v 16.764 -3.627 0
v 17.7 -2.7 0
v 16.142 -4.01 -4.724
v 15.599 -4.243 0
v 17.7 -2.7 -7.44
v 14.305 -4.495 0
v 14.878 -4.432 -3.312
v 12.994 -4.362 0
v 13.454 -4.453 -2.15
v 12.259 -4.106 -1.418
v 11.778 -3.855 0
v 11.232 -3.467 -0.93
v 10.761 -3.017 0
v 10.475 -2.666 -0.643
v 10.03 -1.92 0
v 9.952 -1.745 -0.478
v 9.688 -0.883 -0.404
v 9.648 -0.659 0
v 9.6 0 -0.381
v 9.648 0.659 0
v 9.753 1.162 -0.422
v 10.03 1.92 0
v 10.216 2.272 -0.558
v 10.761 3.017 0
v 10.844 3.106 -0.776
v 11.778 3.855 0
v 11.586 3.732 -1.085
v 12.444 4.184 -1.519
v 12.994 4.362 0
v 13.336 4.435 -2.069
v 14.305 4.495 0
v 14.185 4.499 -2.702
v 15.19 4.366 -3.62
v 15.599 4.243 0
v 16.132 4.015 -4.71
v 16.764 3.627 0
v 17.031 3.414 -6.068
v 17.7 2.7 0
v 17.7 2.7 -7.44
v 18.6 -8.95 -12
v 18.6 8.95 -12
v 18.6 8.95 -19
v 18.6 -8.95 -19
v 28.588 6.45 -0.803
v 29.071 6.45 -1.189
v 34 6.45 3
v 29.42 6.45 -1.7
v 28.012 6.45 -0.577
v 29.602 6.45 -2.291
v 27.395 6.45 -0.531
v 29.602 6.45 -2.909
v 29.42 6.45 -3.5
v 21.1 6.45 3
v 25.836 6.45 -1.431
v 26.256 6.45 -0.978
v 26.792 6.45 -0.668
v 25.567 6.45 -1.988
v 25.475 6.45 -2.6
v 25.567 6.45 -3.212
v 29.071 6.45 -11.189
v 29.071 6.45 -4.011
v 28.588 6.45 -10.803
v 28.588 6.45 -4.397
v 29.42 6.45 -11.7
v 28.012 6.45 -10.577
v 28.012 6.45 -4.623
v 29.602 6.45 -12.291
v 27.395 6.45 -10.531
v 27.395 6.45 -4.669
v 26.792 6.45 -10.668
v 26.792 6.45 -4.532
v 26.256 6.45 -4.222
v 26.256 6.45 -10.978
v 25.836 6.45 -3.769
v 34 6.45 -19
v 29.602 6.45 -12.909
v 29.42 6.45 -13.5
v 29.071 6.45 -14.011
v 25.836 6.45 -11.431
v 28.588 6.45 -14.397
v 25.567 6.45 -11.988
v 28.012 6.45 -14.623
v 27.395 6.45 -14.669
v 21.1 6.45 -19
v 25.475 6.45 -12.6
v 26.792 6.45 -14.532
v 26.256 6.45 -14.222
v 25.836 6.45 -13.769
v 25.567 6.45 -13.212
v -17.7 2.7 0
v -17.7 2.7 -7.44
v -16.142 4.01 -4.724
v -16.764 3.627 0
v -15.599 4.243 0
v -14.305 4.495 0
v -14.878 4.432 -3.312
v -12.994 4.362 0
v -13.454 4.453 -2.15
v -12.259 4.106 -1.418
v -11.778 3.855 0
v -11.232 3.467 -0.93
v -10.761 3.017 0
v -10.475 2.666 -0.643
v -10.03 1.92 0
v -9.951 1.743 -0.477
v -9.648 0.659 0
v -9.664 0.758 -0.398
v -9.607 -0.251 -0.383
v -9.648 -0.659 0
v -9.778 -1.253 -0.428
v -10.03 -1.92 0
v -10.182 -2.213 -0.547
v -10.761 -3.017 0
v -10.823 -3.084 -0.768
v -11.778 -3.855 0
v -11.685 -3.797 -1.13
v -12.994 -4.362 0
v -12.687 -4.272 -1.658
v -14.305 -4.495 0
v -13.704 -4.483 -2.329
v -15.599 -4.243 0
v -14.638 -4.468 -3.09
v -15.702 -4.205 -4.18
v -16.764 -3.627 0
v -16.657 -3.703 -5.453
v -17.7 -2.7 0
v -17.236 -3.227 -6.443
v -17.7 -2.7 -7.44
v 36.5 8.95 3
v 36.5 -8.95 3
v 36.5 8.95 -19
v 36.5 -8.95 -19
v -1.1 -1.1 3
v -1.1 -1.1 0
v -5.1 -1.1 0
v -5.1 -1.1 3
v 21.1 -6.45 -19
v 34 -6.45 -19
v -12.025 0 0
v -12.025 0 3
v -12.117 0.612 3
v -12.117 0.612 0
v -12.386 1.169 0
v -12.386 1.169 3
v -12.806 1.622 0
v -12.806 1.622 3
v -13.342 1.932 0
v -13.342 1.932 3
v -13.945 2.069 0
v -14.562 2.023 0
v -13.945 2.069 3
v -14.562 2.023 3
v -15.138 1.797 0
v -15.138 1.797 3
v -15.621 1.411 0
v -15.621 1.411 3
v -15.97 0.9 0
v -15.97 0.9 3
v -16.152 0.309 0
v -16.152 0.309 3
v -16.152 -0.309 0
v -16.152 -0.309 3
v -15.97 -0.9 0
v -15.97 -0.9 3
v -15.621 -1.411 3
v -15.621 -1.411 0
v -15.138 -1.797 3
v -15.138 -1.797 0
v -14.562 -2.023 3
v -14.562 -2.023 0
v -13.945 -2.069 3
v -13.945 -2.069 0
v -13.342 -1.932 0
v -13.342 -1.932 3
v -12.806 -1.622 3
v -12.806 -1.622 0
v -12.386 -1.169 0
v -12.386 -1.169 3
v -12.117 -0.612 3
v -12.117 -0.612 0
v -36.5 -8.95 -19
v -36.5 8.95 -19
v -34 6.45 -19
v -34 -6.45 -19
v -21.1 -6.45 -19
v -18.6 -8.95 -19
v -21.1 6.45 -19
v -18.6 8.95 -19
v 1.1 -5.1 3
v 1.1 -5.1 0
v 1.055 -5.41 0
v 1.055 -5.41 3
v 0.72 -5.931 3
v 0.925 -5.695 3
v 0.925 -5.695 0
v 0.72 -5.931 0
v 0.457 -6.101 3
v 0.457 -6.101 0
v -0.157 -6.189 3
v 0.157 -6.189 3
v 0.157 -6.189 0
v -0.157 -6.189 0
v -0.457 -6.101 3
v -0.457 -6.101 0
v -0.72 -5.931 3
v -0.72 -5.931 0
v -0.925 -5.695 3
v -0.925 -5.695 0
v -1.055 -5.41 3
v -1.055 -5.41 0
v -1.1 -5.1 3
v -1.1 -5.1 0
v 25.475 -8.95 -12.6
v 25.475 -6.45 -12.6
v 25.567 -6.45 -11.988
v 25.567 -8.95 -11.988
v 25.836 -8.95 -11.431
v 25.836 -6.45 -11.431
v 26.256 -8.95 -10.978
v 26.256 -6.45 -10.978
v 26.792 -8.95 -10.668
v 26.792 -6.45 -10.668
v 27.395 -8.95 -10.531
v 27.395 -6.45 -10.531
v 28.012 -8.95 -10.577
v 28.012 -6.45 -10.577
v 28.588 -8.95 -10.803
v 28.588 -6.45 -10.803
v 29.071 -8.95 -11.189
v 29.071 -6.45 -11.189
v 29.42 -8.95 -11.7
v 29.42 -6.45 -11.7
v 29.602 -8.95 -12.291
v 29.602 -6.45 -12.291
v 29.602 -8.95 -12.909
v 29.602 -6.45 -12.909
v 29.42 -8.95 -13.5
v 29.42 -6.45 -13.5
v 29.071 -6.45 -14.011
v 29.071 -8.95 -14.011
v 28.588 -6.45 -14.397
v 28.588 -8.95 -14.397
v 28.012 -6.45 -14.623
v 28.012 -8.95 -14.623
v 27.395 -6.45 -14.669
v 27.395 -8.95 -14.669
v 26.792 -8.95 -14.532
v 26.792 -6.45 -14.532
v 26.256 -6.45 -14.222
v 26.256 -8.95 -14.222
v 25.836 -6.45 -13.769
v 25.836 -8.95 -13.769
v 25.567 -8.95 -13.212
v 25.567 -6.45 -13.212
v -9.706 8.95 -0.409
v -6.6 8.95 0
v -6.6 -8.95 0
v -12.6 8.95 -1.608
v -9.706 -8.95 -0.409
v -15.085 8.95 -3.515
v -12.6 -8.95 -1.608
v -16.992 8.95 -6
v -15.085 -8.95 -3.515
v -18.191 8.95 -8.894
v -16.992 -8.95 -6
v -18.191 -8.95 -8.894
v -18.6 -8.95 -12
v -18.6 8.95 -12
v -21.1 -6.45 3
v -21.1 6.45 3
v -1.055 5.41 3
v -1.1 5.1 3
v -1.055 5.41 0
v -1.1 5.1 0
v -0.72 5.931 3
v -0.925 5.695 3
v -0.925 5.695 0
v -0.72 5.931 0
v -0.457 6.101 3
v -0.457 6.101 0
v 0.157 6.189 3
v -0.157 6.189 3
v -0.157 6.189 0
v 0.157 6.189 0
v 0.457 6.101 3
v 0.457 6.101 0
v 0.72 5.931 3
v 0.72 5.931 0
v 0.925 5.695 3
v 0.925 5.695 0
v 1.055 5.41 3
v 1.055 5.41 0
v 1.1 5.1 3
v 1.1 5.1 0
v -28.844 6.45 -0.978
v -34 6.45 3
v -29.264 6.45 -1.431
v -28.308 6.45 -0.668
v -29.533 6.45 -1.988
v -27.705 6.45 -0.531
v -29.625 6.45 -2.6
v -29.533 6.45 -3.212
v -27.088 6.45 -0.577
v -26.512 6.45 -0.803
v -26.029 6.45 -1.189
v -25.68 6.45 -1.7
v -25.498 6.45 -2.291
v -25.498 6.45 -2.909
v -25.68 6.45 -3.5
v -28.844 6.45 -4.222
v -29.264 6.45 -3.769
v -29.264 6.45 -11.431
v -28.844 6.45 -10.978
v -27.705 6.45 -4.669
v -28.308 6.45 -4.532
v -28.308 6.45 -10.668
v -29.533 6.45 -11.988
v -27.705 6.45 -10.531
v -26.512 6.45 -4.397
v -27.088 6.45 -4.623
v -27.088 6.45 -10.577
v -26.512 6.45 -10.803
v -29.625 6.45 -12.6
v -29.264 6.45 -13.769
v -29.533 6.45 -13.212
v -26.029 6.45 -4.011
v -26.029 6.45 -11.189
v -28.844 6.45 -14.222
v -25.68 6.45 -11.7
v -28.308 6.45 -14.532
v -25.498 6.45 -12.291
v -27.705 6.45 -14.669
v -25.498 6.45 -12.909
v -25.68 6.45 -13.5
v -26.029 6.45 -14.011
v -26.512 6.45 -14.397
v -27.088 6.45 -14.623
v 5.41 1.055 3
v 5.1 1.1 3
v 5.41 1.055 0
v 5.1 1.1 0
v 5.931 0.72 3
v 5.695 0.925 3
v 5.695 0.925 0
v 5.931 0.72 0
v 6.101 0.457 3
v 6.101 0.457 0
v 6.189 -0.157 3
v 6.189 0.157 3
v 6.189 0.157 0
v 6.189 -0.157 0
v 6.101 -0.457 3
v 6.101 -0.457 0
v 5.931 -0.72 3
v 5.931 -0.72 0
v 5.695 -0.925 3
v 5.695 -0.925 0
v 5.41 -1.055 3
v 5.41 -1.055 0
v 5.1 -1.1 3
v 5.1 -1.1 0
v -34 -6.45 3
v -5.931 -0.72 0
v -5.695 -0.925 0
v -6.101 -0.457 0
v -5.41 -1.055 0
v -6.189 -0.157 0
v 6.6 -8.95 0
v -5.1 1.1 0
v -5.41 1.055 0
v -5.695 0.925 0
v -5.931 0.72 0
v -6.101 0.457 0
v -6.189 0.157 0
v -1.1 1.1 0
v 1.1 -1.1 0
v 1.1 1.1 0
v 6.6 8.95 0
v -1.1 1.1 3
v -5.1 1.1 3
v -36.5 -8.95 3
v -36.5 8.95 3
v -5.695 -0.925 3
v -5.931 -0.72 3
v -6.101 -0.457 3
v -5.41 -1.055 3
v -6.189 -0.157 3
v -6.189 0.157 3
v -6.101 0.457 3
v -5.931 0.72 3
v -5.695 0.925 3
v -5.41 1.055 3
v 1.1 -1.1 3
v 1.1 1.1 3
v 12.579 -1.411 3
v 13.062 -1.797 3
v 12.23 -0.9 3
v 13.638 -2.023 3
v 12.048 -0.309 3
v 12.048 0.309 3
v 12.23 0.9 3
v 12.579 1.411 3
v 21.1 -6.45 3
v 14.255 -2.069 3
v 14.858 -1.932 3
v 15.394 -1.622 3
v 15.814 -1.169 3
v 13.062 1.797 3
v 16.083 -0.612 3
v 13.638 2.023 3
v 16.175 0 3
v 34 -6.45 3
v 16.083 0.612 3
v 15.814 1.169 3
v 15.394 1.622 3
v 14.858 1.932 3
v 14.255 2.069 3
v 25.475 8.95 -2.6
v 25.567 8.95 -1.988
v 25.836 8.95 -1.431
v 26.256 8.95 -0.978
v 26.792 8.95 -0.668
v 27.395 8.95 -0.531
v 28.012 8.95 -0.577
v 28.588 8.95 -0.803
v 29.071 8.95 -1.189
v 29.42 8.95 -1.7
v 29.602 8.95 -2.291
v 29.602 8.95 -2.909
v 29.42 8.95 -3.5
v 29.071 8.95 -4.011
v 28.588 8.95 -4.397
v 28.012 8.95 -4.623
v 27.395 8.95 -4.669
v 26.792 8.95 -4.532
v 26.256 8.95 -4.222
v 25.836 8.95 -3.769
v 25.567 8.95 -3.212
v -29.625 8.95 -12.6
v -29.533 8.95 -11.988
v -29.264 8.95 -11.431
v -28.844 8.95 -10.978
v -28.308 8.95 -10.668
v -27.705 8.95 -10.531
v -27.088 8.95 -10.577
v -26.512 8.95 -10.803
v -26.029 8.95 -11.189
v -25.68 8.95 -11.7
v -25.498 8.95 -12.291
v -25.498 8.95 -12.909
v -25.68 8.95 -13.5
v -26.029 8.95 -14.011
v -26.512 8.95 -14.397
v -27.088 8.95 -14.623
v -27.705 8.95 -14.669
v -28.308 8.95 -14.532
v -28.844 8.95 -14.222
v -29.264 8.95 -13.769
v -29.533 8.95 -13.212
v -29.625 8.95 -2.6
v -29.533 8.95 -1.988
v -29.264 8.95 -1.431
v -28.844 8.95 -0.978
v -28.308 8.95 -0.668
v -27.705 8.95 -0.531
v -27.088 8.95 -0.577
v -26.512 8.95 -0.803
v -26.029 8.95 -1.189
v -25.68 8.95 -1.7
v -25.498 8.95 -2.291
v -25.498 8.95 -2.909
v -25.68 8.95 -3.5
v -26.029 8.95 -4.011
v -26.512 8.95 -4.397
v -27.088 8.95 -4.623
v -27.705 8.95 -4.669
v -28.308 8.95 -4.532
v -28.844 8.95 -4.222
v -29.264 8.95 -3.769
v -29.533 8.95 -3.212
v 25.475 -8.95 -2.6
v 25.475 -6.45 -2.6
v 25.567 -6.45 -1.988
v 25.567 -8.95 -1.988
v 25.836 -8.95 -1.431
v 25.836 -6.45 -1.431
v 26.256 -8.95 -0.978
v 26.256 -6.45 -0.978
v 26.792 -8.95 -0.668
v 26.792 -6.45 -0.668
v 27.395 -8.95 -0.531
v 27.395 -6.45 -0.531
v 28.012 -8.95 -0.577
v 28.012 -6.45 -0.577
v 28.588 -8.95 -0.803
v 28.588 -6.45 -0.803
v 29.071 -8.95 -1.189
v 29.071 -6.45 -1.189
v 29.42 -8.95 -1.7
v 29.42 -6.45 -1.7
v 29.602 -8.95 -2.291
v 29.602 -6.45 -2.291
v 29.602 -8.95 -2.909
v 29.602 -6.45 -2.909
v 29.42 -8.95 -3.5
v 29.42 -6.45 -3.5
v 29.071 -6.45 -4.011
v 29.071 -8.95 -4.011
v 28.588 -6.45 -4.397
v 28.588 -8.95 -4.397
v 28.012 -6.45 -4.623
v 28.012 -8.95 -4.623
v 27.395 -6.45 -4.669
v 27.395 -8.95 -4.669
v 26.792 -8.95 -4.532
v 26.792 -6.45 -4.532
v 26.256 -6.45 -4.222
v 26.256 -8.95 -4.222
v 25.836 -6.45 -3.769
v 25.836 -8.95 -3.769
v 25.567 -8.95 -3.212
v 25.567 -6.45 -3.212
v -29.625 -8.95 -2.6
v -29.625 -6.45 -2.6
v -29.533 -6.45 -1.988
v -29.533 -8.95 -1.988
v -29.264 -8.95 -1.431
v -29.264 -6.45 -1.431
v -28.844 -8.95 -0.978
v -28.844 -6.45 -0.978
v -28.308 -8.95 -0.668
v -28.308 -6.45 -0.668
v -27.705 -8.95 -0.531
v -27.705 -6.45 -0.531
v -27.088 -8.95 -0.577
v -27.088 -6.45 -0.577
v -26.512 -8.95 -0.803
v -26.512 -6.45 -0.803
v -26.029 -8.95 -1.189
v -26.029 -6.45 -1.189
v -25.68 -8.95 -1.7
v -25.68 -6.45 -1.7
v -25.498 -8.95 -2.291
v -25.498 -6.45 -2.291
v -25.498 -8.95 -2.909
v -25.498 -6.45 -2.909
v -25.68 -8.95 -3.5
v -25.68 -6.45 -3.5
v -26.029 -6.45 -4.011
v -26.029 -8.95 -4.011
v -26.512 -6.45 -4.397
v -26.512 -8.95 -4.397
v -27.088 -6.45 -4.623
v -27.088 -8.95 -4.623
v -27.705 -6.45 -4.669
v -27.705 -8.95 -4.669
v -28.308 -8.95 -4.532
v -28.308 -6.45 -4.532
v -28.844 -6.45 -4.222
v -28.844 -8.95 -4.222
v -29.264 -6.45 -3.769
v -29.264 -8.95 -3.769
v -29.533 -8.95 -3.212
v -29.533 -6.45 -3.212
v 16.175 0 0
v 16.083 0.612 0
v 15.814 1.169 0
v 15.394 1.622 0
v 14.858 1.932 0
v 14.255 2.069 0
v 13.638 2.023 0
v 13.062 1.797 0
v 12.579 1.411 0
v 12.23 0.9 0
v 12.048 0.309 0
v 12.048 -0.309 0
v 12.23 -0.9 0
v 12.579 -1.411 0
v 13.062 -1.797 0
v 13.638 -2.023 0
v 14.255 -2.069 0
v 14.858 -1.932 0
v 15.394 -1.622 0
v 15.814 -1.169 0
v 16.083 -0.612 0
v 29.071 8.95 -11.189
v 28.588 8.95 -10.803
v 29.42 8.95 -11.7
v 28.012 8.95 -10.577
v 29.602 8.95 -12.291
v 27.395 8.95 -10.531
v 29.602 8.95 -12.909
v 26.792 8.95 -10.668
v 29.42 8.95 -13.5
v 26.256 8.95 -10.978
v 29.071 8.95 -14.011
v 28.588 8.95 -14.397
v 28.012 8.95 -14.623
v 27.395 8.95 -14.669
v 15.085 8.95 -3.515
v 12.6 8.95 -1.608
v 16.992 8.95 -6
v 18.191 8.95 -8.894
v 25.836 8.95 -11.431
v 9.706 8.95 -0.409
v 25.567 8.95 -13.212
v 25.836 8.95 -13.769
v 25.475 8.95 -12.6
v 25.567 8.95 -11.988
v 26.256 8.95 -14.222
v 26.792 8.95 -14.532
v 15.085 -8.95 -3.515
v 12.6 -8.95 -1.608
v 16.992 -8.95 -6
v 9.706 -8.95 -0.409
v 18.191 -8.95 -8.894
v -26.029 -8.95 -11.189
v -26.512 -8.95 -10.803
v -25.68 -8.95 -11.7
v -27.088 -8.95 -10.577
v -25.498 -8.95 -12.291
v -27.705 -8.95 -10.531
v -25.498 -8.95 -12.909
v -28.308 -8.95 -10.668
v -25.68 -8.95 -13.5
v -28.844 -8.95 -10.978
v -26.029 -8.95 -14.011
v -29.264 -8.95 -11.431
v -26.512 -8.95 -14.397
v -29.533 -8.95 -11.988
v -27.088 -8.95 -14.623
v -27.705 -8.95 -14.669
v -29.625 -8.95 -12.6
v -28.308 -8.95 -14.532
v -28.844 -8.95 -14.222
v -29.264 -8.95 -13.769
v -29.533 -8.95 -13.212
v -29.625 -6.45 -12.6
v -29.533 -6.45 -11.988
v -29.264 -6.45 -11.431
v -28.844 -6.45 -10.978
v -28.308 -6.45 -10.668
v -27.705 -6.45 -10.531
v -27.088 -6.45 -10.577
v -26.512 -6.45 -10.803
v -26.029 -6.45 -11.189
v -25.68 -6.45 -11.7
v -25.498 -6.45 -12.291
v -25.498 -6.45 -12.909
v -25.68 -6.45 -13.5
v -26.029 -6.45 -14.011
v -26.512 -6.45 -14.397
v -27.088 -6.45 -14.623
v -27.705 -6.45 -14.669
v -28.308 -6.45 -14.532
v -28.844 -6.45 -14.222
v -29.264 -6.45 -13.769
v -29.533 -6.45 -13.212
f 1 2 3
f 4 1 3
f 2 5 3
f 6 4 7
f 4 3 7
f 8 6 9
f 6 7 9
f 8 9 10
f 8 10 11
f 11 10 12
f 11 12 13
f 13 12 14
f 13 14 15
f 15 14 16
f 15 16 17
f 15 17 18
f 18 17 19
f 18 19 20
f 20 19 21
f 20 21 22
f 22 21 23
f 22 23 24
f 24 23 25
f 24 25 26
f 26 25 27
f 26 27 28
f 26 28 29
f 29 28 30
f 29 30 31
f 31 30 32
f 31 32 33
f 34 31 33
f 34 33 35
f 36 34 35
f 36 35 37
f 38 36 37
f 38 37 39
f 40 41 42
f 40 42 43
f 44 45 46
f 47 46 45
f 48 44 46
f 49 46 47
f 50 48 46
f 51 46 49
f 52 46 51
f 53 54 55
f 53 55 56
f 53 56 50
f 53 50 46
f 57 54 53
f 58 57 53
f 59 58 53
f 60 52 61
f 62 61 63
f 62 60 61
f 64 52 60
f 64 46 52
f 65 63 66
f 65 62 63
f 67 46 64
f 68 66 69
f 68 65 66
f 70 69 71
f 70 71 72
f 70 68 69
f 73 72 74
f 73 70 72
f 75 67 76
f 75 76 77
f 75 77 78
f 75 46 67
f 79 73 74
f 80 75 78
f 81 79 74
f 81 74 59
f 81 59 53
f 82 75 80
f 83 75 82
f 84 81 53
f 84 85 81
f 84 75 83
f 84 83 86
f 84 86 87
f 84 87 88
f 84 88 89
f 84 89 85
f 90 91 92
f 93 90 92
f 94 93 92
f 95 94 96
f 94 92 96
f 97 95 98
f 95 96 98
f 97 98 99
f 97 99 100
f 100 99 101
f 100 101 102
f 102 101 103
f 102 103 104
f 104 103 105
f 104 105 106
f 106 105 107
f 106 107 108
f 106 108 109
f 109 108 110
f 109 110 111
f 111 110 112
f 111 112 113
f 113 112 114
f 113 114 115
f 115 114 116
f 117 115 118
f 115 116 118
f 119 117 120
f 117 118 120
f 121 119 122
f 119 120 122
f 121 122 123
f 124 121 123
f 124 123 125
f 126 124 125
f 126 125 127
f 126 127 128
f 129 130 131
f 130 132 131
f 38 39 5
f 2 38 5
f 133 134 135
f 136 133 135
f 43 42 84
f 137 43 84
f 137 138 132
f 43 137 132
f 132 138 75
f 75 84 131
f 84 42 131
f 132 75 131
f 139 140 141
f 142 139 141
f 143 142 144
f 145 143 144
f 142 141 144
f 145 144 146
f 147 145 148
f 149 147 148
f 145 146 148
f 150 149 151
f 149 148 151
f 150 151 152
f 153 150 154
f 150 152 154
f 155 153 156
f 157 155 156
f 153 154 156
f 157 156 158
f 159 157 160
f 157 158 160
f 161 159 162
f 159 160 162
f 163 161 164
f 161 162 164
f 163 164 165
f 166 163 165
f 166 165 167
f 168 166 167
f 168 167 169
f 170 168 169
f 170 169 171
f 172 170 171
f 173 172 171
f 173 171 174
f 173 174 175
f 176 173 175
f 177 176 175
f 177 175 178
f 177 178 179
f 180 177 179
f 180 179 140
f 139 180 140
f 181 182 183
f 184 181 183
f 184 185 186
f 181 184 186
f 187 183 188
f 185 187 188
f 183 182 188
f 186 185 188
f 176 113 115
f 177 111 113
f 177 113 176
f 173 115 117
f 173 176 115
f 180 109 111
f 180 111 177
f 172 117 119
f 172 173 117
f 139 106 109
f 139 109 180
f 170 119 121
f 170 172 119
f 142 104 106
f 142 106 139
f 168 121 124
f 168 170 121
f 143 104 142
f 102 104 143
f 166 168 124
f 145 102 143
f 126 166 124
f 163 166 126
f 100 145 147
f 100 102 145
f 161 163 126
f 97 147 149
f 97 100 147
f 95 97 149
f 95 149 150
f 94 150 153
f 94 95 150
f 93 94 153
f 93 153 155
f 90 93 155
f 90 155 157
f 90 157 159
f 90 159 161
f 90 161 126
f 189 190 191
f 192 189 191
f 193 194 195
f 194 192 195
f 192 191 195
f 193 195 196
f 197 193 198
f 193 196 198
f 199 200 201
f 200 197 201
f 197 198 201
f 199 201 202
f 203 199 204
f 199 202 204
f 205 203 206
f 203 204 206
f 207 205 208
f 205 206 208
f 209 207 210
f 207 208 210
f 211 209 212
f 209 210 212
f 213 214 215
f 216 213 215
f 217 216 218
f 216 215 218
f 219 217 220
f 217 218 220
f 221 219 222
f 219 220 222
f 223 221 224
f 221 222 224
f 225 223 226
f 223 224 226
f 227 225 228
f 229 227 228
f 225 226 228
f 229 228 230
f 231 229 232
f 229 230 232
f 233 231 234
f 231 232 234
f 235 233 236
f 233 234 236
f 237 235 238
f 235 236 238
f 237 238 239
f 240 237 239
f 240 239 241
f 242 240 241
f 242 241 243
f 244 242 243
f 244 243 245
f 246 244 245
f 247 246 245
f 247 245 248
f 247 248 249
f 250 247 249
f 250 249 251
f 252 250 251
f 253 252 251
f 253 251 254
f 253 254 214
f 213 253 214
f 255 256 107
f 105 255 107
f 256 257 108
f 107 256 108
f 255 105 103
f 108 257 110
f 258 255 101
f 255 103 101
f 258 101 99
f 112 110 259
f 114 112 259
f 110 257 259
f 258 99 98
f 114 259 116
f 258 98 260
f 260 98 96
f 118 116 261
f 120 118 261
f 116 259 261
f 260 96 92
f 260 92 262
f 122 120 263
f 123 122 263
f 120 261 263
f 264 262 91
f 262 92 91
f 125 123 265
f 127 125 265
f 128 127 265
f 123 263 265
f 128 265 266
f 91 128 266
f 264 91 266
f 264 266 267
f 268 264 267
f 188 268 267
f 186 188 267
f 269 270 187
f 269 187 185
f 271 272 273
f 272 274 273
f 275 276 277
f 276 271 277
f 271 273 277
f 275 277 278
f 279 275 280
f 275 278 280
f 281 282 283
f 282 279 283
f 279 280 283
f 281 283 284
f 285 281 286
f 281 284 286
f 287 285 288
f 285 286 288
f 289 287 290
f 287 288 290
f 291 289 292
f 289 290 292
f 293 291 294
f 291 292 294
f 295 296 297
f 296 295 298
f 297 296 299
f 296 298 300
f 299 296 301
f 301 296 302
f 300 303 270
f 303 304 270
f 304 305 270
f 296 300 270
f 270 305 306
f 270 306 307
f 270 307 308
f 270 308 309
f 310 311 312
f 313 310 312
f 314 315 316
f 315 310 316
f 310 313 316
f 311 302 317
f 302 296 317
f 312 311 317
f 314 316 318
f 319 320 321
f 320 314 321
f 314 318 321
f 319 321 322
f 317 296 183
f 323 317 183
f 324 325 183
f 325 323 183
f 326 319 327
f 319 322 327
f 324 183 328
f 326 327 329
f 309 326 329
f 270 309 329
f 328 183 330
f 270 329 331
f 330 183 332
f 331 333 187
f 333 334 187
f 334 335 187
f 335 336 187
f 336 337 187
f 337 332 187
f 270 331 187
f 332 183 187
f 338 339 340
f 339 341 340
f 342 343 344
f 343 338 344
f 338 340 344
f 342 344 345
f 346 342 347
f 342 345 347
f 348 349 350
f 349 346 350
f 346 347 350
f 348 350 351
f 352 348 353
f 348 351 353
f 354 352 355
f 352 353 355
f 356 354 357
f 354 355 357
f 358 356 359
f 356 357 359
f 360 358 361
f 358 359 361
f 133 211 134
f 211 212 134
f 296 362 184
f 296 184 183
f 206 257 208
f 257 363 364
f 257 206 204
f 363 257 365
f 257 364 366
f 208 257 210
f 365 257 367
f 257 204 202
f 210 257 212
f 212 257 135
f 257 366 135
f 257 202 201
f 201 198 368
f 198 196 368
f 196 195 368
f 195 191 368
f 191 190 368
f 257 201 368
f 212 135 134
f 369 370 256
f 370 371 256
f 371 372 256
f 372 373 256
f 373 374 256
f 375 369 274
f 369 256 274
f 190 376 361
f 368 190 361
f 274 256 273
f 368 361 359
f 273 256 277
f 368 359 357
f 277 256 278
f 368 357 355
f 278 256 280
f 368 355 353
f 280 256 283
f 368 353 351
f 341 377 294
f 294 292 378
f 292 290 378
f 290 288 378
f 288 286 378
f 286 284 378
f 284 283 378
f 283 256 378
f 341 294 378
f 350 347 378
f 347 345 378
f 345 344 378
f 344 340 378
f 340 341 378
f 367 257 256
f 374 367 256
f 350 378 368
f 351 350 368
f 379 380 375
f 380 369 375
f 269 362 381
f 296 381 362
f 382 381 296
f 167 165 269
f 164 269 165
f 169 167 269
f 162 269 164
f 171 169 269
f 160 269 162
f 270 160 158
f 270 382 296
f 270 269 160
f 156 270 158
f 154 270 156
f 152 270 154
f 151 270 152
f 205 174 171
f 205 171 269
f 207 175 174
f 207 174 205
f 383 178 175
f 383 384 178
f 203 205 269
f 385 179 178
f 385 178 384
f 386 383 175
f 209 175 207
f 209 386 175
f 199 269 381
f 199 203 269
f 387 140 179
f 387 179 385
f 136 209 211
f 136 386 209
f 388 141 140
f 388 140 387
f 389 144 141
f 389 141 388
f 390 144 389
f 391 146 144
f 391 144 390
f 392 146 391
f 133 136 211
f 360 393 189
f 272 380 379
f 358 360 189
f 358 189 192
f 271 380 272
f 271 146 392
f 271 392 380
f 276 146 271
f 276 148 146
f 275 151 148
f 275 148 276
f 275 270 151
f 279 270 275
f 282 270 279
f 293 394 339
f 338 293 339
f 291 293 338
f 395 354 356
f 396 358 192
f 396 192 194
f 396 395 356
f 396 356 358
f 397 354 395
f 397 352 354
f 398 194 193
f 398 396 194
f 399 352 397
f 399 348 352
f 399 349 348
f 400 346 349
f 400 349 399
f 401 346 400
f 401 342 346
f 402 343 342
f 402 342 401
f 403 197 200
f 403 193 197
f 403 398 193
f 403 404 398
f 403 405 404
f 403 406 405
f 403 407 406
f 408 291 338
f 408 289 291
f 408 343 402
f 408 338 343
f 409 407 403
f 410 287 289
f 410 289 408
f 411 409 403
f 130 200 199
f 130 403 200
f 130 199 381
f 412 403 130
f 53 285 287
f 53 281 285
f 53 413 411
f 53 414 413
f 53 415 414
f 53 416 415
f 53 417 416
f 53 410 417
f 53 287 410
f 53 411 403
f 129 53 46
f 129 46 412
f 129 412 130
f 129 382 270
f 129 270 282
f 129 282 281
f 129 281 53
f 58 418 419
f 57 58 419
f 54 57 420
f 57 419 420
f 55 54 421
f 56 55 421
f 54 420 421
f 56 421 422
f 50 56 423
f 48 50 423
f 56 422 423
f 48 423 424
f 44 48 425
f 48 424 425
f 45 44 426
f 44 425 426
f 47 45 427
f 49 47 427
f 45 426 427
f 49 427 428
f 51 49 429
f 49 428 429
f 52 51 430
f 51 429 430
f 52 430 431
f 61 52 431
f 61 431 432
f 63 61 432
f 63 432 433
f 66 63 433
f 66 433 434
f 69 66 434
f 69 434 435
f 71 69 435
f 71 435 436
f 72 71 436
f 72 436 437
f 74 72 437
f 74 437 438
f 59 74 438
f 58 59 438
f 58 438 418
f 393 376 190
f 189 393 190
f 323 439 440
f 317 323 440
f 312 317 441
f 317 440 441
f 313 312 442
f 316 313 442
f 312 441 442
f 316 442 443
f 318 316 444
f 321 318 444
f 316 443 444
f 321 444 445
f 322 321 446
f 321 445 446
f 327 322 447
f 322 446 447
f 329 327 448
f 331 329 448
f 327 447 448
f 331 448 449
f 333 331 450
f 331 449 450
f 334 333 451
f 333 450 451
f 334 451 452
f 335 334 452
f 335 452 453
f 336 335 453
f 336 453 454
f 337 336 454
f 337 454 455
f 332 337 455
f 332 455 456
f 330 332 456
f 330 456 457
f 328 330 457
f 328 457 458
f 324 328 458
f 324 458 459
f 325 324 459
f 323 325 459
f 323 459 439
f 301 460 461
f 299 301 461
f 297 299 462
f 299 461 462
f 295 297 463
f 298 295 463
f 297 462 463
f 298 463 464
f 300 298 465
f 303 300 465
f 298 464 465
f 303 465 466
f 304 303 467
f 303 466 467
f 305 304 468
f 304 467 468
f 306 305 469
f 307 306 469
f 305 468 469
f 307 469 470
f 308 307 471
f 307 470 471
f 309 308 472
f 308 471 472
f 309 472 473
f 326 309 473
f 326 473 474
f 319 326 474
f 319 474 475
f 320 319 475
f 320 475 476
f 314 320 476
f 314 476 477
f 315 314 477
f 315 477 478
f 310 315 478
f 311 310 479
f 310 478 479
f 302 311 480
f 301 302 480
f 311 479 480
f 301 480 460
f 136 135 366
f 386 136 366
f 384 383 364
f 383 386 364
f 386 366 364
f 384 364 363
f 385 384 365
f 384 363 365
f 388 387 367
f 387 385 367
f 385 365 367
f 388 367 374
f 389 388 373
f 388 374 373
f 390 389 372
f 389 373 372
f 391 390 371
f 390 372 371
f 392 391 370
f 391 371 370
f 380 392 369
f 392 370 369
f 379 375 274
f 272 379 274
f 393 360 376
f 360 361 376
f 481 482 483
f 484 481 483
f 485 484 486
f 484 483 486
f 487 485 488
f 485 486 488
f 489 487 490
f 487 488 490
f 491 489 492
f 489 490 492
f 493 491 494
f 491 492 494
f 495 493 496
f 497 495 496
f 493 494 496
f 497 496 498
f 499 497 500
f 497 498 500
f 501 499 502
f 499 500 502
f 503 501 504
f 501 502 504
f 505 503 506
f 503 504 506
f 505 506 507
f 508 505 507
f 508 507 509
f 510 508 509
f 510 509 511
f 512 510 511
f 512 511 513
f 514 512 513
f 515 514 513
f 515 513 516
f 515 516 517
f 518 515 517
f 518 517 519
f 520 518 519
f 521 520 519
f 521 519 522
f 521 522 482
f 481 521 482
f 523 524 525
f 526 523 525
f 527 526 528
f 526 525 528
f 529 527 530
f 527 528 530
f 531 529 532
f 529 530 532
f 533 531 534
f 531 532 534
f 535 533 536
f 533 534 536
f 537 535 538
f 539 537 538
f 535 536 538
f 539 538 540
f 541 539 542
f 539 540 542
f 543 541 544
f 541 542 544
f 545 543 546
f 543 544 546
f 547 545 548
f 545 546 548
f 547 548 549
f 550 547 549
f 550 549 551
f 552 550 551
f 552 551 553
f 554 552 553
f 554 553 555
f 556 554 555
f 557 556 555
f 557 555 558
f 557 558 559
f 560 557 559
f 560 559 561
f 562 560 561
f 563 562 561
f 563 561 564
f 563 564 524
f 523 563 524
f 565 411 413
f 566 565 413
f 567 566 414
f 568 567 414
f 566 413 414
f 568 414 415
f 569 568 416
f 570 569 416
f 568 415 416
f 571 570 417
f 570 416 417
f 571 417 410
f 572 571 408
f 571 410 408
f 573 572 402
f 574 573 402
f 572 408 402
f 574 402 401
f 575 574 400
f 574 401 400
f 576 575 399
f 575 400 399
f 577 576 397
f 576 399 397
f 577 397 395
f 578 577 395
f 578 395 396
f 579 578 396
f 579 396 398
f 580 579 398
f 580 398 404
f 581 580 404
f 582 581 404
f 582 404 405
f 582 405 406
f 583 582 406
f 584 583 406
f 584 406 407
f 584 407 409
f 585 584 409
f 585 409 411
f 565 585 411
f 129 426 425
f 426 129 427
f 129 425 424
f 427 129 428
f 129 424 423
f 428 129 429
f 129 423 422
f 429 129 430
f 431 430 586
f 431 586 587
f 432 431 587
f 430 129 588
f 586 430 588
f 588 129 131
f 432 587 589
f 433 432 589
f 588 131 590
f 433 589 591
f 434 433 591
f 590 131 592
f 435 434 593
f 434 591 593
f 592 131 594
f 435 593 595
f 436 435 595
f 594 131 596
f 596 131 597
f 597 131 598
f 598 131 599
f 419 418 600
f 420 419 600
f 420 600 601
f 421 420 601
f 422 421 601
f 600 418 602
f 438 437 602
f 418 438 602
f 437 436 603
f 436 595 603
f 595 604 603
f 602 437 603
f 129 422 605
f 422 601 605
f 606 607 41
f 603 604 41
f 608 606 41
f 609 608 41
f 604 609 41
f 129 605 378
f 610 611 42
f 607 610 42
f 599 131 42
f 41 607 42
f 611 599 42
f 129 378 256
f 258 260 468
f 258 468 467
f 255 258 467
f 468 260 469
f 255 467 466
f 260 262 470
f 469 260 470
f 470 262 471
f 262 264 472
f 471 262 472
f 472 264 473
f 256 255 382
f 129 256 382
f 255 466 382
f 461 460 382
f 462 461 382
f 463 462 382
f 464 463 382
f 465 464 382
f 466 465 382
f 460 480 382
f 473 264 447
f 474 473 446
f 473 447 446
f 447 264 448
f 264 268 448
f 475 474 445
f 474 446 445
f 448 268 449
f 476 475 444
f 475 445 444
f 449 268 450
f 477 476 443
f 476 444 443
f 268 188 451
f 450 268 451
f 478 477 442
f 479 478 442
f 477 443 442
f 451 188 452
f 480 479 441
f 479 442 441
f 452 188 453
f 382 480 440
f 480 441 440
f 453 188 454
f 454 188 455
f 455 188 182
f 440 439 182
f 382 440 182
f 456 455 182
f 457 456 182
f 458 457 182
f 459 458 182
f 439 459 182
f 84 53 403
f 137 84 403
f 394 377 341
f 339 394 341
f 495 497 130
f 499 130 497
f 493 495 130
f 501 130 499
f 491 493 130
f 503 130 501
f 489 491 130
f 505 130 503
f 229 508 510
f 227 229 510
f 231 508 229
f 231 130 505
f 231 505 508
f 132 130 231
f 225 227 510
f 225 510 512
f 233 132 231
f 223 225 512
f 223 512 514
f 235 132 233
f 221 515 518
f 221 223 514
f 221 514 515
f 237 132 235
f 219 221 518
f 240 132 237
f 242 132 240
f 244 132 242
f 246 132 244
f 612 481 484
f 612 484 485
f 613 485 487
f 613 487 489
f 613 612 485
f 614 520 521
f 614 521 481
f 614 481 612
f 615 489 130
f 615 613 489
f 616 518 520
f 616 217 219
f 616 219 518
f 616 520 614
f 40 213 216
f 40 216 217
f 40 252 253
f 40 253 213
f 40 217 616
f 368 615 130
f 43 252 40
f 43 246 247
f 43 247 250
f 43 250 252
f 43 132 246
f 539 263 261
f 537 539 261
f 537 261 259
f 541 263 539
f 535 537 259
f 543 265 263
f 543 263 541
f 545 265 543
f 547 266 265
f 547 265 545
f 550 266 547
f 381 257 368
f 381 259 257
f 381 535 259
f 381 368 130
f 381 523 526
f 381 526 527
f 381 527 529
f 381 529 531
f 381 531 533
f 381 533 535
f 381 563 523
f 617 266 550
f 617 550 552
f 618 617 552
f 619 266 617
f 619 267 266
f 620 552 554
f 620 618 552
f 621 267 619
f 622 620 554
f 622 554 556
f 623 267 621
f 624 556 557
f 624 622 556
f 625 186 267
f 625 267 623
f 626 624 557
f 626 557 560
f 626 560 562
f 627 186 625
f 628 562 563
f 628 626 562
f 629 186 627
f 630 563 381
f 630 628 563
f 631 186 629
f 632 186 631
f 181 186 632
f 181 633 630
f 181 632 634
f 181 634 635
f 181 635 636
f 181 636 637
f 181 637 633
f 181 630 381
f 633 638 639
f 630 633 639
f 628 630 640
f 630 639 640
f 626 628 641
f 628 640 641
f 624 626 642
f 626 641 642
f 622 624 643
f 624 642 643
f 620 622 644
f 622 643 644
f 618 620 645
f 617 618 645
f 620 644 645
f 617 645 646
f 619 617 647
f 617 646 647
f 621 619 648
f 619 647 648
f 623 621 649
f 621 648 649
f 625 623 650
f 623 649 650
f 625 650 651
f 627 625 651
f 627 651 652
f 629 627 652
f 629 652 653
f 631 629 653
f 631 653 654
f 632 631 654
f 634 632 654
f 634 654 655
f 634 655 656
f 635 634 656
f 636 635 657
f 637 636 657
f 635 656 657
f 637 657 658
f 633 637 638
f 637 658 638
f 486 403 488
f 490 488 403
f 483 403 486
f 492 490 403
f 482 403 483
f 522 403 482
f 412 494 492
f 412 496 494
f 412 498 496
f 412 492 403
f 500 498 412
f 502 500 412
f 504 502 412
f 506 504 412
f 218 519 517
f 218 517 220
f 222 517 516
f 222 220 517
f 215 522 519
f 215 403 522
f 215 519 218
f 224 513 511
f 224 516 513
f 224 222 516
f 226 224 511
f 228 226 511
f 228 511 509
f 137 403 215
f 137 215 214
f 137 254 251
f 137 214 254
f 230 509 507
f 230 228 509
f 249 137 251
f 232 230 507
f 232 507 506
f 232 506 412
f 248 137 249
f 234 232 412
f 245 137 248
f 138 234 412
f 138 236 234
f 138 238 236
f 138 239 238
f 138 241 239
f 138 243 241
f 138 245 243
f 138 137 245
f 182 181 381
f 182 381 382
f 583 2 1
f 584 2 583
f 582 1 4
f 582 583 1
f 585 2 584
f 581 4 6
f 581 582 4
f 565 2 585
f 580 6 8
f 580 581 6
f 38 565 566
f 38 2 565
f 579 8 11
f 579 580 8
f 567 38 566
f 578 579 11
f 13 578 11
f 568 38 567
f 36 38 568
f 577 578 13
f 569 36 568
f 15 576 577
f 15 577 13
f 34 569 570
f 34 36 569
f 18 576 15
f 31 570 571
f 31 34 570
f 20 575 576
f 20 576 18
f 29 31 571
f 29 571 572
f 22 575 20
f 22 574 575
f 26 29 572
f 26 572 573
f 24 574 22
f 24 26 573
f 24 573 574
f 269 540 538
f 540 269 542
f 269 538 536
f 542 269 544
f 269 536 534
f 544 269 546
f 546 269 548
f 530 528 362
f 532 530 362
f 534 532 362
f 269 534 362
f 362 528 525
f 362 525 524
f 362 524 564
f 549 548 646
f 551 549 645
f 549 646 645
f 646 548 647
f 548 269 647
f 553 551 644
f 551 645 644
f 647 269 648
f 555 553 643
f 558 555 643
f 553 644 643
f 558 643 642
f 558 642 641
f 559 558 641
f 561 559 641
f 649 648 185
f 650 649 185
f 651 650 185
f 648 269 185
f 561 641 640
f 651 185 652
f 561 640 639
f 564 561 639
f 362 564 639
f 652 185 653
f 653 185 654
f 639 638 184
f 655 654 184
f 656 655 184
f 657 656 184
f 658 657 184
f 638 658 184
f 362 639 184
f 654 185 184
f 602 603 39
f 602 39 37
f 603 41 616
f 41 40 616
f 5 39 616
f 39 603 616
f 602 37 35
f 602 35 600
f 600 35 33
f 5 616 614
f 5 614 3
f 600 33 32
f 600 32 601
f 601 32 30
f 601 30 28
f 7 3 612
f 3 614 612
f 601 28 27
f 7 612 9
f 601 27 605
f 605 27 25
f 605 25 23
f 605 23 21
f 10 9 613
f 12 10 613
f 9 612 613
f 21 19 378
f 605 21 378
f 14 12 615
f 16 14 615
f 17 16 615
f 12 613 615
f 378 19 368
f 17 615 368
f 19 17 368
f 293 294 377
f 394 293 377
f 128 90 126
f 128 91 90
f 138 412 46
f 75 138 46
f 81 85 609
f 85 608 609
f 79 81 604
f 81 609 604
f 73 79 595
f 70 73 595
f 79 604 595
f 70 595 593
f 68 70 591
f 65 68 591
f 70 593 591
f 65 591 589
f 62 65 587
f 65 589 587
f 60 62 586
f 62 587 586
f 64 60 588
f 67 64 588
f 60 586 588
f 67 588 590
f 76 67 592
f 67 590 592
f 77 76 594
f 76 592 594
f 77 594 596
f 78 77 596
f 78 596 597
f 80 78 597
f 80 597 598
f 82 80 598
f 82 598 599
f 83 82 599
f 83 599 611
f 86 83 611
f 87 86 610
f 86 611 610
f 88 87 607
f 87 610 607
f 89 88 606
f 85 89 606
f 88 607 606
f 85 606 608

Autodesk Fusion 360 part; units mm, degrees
sketch "Sketch1" plane through (0, 0, 0) normal (0, 0, 1) x (1, 0, 0)
  line L0 (-1.1, 1.1) -> (-1.1, 5.1)
  arc A0 (1.1, 5.1) -> (-1.1, 5.1) centre (0, 5.1) ccw
  line L1 (1.1, 5.1) -> (1.1, 1.1)
  line L2 (-1.1, 5.1) -> (1.1, 5.1) construction
  line L3 (1.1, 1.1) -> (-1.1, 1.1) construction
  line L4 (-1.1, 1.1) -> (-1.1, -1.1) construction
  line L5 (-1.1, -1.1) -> (1.1, -1.1) construction
  line L6 (1.1, -1.1) -> (1.1, 1.1) construction
  line L7 (1.1, 1.1) -> (-1.1, -1.1) construction
  line L8 (-1.1, 1.1) -> (1.1, -1.1) construction
  line L9 (-1.1, -1.1) -> (-5.1, -1.1)
  arc A1 (-5.1, 1.1) -> (-5.1, -1.1) centre (-5.1, 0) ccw
  line L10 (-5.1, 1.1) -> (-1.1, 1.1)
  line L11 (1.1, -1.1) -> (1.1, -5.1)
  arc A2 (-1.1, -5.1) -> (1.1, -5.1) centre (0, -5.1) ccw
  line L12 (-1.1, -5.1) -> (-1.1, -1.1)
  line L13 (1.1, 1.1) -> (5.1, 1.1)
  arc A3 (5.1, -1.1) -> (5.1, 1.1) centre (5.1, 0) ccw
  line L14 (5.1, -1.1) -> (1.1, -1.1)
  line L15 (7.1, 7.1) -> (-7.1, 7.1)
  line L16 (-7.1, 7.1) -> (-7.1, -7.1)
  line L17 (-7.1, -7.1) -> (7.1, -7.1)
  line L18 (7.1, -7.1) -> (7.1, 7.1)
  line L19 (7.1, 7.1) -> (-7.1, -7.1) construction
  line L20 (-7.1, 7.1) -> (7.1, -7.1) construction
  dimension "d2" = 2.2
  dimension "d3" = 2.2
  dimension "d4" = 2.2
  dimension "d5" = 4
  dimension "d7" = 360
  dimension "d37" = 2
extrude "Extrude1" add sketch "Sketch1" along normal blind 3
sketch "Sketch2" plane through (0, 0, 0) normal (0, 0, 1) x (1, 0, 0)
  line L0 (-33.9, 6.35) -> (-21.2, 6.35) construction
  line L1 (-21.2, 6.35) -> (-21.2, -6.35) construction
  line L2 (-21.2, -6.35) -> (-33.9, -6.35) construction
  line L3 (-33.9, -6.35) -> (-33.9, 6.35) construction
  line L4 (21.2, 6.35) -> (33.9, 6.35) construction
  line L5 (33.9, 6.35) -> (33.9, -6.35) construction
  line L6 (33.9, -6.35) -> (21.2, -6.35) construction
  line L7 (21.2, -6.35) -> (21.2, 6.35) construction
  line L8 (-21.2, 0) -> (21.2, 0) construction
  line L9 (-21.1, -6.45) -> (-34, -6.45)
  line L10 (-34, -6.45) -> (-34, 6.45)
  line L11 (-34, 6.45) -> (-21.1, 6.45)
  line L12 (-21.1, 6.45) -> (-21.1, -6.45)
  line L13 (-18.6, -8.95) -> (-36.5, -8.95)
  line L14 (-36.5, -8.95) -> (-36.5, 8.95)
  line L15 (-36.5, 8.95) -> (-18.6, 8.95)
  line L16 (-18.6, 8.95) -> (-18.6, -8.95)
  line L17 (0, 2.5) -> (0, 20)
  line L18 (34, -6.45) -> (34, 6.45)
  line L19 (34, 6.45) -> (21.1, 6.45)
  line L20 (21.1, 6.45) -> (21.1, -6.45)
  line L21 (21.1, -6.45) -> (34, -6.45)
  line L22 (36.5, -8.95) -> (36.5, 8.95)
  line L23 (36.5, 8.95) -> (18.6, 8.95)
  line L24 (18.6, -8.95) -> (36.5, -8.95)
  line L25 (18.6, 8.95) -> (18.6, -8.95)
  line L26 (-18.6, -2.6) -> (-18.6, -8.95)
  line L27 (-18.6, 8.95) -> (18.6, 8.95)
  line L28 (18.6, -8.95) -> (-18.6, -8.95)
  line L29 (-7.1, 7.1) -> (-7.1, -7.1)
  line L30 (-7.1, -7.1) -> (7.1, -7.1)
  line L31 (7.1, -7.1) -> (7.1, 7.1)
  line L32 (7.1, 7.1) -> (-7.1, 7.1)
  dimension "d18" = 12.7
  dimension "d19" = 12.7
  dimension "d20" = 42.4
  dimension "d23" = -2.5
extrude "Extrude2" add sketch "Sketch2" along normal blind 3
extrude "Extrude3" add sketch "Sketch2" against normal blind 19 contours L13 L14 L15 L16 L26 | L22 L23 L24 L25
fillet "Fillet1" radius 12 2 edges at (-18.6, 0, 0) (18.6, 0, 0)
sketch "Sketch3" plane through (0, 8.95, 0) normal (0, 1, 0) x (-1, 0, 0)
  line L0 (36.5, -19) -> (36.5, 3)
  line L1 (36.5, 3) -> (-36.5, 3)
  line L2 (18.6, -12) -> (18.6, -19)
  line L3 (-36.5, -19) -> (-18.6, -19)
  circle A0 centre (-27.55, -12.6) radius 2.075
  circle A1 centre (-27.55, -2.6) radius 2.075
  line L4 (-27.55, -19) -> (-27.55, 3) construction
  line L5 (-36.5, 3) -> (-36.5, -19)
  line L6 (-18.6, -19) -> (-18.6, -12)
  line L7 (18.6, -19) -> (36.5, -19)
  line L8 (0, 1.75) -> (0, 22.5)
  circle A2 centre (27.55, -12.6) radius 2.075
  circle A3 centre (27.55, -2.6) radius 2.075
  dimension "d32" = 4.15
  dimension "d33" = 10
  dimension "d34" = 5.6
extrude "Extrude4" cut sketch "Sketch3" against normal blind 17.9
sketch "Sketch4" plane through (0, 0, 3) normal (0, 0, 1) x (1, 0, 0)
  line L0 (36.5, -8.95) -> (36.5, 8.95)
  line L1 (36.5, 8.95) -> (-36.5, 8.95)
  line L2 (-36.5, 8.95) -> (-36.5, -8.95)
  line L3 (-36.5, -8.95) -> (36.5, -8.95)
  line L4 (-34, 6.45) -> (-21.1, 6.45)
  line L5 (-21.1, 6.45) -> (-21.1, -6.45)
  line L6 (-21.1, -6.45) -> (-34, -6.45)
  line L7 (-34, -6.45) -> (-34, 6.45)
  line L8 (34, -6.45) -> (21.1, -6.45)
  line L9 (21.1, -6.45) -> (21.1, 6.45)
  line L10 (21.1, 6.45) -> (34, 6.45)
  line L11 (34, 6.45) -> (34, -6.45)
  arc A0 (1.1, 5.1) -> (-1.1, 5.1) centre (0, 5.1) ccw
  line L12 (1.1, 5.1) -> (1.1, 1.1)
  line L13 (1.1, 1.1) -> (5.1, 1.1)
  arc A1 (5.1, -1.1) -> (5.1, 1.1) centre (5.1, 0) ccw
  line L14 (5.1, -1.1) -> (1.1, -1.1)
  line L15 (1.1, -1.1) -> (1.1, -5.1)
  arc A2 (-1.1, -5.1) -> (1.1, -5.1) centre (0, -5.1) ccw
  line L16 (-1.1, -5.1) -> (-1.1, -1.1)
  line L17 (-1.1, -1.1) -> (-5.1, -1.1)
  arc A3 (-5.1, 1.1) -> (-5.1, -1.1) centre (-5.1, 0) ccw
  line L18 (-5.1, 1.1) -> (-1.1, 1.1)
  line L19 (-1.1, 1.1) -> (-1.1, 5.1)
  line L20 (-21.1, 6.45) -> (-21.1, -6.45)
  line L21 (21.1, -6.45) -> (21.1, 6.45)
  line L22 (-21.1, 0) -> (21.1, 0) construction
  circle A4 centre (-14.1, 0) radius 2.075
  line L23 (0, 2.5) -> (0, 20)
  circle A5 centre (14.1, 0) radius 2.075
  dimension "d38" = 7
  dimension "d39" = 4.15
extrude "Extrude5" cut sketch "Sketch4" against normal blind 22 contours A4 | A5
ref_plane "WorkPlane1" through (0, 0, -6) normal (0, 0, -1) x (-1, 0, 0)
sketch "Sketch5" plane through (0, 0, -6) normal (0, 0, -1) x (-1, 0, 0)
  line L0 (-21.1, 6.45) -> (-21.1, -6.45)
  line L1 (21.1, -6.45) -> (21.1, 6.45)
  line L2 (-21.1, 0) -> (21.1, 0) construction
  circle A0 centre (-14.1, 0) radius 4.5
  line L3 (0, 1.75) -> (0, 22.5)
  circle A1 centre (14.1, 0) radius 4.5
  line L4 (-17.7, 2.7) -> (-17.7, -2.7)
  line L5 (17.7, 2.7) -> (17.7, -2.7)
  dimension "d43" = 9
  dimension "d44" = 7
  dimension "d49" = 3.6
extrude "Extrude6" cut sketch "Sketch5" along normal blind -6 and the other way blind -45.366 contours A0 L4 | A1 L5 picked at (-15.387, 1.0056) picked at (14.9987, -0.474)
equation "mounting_size = 2.2 mm"
equation "d2 = mounting_size"
equation "d3 = mounting_size"
equation "d4 = mounting_size"
equation "d21 = -tolerance_bar"
equation "tolerance_bar = 0.1 mm"
equation "d30 = 13 mm - ( 4 / 4 ) * 1 mm"
equation "tolerance_hole = 0.15 mm"
equation "d32 = 4 mm + tolerance_hole"
equation "d39 = 4 mm + tolerance_hole"
equation "d49 = ( 7 / 2 ) * 1 mm + 0.1 mm"
